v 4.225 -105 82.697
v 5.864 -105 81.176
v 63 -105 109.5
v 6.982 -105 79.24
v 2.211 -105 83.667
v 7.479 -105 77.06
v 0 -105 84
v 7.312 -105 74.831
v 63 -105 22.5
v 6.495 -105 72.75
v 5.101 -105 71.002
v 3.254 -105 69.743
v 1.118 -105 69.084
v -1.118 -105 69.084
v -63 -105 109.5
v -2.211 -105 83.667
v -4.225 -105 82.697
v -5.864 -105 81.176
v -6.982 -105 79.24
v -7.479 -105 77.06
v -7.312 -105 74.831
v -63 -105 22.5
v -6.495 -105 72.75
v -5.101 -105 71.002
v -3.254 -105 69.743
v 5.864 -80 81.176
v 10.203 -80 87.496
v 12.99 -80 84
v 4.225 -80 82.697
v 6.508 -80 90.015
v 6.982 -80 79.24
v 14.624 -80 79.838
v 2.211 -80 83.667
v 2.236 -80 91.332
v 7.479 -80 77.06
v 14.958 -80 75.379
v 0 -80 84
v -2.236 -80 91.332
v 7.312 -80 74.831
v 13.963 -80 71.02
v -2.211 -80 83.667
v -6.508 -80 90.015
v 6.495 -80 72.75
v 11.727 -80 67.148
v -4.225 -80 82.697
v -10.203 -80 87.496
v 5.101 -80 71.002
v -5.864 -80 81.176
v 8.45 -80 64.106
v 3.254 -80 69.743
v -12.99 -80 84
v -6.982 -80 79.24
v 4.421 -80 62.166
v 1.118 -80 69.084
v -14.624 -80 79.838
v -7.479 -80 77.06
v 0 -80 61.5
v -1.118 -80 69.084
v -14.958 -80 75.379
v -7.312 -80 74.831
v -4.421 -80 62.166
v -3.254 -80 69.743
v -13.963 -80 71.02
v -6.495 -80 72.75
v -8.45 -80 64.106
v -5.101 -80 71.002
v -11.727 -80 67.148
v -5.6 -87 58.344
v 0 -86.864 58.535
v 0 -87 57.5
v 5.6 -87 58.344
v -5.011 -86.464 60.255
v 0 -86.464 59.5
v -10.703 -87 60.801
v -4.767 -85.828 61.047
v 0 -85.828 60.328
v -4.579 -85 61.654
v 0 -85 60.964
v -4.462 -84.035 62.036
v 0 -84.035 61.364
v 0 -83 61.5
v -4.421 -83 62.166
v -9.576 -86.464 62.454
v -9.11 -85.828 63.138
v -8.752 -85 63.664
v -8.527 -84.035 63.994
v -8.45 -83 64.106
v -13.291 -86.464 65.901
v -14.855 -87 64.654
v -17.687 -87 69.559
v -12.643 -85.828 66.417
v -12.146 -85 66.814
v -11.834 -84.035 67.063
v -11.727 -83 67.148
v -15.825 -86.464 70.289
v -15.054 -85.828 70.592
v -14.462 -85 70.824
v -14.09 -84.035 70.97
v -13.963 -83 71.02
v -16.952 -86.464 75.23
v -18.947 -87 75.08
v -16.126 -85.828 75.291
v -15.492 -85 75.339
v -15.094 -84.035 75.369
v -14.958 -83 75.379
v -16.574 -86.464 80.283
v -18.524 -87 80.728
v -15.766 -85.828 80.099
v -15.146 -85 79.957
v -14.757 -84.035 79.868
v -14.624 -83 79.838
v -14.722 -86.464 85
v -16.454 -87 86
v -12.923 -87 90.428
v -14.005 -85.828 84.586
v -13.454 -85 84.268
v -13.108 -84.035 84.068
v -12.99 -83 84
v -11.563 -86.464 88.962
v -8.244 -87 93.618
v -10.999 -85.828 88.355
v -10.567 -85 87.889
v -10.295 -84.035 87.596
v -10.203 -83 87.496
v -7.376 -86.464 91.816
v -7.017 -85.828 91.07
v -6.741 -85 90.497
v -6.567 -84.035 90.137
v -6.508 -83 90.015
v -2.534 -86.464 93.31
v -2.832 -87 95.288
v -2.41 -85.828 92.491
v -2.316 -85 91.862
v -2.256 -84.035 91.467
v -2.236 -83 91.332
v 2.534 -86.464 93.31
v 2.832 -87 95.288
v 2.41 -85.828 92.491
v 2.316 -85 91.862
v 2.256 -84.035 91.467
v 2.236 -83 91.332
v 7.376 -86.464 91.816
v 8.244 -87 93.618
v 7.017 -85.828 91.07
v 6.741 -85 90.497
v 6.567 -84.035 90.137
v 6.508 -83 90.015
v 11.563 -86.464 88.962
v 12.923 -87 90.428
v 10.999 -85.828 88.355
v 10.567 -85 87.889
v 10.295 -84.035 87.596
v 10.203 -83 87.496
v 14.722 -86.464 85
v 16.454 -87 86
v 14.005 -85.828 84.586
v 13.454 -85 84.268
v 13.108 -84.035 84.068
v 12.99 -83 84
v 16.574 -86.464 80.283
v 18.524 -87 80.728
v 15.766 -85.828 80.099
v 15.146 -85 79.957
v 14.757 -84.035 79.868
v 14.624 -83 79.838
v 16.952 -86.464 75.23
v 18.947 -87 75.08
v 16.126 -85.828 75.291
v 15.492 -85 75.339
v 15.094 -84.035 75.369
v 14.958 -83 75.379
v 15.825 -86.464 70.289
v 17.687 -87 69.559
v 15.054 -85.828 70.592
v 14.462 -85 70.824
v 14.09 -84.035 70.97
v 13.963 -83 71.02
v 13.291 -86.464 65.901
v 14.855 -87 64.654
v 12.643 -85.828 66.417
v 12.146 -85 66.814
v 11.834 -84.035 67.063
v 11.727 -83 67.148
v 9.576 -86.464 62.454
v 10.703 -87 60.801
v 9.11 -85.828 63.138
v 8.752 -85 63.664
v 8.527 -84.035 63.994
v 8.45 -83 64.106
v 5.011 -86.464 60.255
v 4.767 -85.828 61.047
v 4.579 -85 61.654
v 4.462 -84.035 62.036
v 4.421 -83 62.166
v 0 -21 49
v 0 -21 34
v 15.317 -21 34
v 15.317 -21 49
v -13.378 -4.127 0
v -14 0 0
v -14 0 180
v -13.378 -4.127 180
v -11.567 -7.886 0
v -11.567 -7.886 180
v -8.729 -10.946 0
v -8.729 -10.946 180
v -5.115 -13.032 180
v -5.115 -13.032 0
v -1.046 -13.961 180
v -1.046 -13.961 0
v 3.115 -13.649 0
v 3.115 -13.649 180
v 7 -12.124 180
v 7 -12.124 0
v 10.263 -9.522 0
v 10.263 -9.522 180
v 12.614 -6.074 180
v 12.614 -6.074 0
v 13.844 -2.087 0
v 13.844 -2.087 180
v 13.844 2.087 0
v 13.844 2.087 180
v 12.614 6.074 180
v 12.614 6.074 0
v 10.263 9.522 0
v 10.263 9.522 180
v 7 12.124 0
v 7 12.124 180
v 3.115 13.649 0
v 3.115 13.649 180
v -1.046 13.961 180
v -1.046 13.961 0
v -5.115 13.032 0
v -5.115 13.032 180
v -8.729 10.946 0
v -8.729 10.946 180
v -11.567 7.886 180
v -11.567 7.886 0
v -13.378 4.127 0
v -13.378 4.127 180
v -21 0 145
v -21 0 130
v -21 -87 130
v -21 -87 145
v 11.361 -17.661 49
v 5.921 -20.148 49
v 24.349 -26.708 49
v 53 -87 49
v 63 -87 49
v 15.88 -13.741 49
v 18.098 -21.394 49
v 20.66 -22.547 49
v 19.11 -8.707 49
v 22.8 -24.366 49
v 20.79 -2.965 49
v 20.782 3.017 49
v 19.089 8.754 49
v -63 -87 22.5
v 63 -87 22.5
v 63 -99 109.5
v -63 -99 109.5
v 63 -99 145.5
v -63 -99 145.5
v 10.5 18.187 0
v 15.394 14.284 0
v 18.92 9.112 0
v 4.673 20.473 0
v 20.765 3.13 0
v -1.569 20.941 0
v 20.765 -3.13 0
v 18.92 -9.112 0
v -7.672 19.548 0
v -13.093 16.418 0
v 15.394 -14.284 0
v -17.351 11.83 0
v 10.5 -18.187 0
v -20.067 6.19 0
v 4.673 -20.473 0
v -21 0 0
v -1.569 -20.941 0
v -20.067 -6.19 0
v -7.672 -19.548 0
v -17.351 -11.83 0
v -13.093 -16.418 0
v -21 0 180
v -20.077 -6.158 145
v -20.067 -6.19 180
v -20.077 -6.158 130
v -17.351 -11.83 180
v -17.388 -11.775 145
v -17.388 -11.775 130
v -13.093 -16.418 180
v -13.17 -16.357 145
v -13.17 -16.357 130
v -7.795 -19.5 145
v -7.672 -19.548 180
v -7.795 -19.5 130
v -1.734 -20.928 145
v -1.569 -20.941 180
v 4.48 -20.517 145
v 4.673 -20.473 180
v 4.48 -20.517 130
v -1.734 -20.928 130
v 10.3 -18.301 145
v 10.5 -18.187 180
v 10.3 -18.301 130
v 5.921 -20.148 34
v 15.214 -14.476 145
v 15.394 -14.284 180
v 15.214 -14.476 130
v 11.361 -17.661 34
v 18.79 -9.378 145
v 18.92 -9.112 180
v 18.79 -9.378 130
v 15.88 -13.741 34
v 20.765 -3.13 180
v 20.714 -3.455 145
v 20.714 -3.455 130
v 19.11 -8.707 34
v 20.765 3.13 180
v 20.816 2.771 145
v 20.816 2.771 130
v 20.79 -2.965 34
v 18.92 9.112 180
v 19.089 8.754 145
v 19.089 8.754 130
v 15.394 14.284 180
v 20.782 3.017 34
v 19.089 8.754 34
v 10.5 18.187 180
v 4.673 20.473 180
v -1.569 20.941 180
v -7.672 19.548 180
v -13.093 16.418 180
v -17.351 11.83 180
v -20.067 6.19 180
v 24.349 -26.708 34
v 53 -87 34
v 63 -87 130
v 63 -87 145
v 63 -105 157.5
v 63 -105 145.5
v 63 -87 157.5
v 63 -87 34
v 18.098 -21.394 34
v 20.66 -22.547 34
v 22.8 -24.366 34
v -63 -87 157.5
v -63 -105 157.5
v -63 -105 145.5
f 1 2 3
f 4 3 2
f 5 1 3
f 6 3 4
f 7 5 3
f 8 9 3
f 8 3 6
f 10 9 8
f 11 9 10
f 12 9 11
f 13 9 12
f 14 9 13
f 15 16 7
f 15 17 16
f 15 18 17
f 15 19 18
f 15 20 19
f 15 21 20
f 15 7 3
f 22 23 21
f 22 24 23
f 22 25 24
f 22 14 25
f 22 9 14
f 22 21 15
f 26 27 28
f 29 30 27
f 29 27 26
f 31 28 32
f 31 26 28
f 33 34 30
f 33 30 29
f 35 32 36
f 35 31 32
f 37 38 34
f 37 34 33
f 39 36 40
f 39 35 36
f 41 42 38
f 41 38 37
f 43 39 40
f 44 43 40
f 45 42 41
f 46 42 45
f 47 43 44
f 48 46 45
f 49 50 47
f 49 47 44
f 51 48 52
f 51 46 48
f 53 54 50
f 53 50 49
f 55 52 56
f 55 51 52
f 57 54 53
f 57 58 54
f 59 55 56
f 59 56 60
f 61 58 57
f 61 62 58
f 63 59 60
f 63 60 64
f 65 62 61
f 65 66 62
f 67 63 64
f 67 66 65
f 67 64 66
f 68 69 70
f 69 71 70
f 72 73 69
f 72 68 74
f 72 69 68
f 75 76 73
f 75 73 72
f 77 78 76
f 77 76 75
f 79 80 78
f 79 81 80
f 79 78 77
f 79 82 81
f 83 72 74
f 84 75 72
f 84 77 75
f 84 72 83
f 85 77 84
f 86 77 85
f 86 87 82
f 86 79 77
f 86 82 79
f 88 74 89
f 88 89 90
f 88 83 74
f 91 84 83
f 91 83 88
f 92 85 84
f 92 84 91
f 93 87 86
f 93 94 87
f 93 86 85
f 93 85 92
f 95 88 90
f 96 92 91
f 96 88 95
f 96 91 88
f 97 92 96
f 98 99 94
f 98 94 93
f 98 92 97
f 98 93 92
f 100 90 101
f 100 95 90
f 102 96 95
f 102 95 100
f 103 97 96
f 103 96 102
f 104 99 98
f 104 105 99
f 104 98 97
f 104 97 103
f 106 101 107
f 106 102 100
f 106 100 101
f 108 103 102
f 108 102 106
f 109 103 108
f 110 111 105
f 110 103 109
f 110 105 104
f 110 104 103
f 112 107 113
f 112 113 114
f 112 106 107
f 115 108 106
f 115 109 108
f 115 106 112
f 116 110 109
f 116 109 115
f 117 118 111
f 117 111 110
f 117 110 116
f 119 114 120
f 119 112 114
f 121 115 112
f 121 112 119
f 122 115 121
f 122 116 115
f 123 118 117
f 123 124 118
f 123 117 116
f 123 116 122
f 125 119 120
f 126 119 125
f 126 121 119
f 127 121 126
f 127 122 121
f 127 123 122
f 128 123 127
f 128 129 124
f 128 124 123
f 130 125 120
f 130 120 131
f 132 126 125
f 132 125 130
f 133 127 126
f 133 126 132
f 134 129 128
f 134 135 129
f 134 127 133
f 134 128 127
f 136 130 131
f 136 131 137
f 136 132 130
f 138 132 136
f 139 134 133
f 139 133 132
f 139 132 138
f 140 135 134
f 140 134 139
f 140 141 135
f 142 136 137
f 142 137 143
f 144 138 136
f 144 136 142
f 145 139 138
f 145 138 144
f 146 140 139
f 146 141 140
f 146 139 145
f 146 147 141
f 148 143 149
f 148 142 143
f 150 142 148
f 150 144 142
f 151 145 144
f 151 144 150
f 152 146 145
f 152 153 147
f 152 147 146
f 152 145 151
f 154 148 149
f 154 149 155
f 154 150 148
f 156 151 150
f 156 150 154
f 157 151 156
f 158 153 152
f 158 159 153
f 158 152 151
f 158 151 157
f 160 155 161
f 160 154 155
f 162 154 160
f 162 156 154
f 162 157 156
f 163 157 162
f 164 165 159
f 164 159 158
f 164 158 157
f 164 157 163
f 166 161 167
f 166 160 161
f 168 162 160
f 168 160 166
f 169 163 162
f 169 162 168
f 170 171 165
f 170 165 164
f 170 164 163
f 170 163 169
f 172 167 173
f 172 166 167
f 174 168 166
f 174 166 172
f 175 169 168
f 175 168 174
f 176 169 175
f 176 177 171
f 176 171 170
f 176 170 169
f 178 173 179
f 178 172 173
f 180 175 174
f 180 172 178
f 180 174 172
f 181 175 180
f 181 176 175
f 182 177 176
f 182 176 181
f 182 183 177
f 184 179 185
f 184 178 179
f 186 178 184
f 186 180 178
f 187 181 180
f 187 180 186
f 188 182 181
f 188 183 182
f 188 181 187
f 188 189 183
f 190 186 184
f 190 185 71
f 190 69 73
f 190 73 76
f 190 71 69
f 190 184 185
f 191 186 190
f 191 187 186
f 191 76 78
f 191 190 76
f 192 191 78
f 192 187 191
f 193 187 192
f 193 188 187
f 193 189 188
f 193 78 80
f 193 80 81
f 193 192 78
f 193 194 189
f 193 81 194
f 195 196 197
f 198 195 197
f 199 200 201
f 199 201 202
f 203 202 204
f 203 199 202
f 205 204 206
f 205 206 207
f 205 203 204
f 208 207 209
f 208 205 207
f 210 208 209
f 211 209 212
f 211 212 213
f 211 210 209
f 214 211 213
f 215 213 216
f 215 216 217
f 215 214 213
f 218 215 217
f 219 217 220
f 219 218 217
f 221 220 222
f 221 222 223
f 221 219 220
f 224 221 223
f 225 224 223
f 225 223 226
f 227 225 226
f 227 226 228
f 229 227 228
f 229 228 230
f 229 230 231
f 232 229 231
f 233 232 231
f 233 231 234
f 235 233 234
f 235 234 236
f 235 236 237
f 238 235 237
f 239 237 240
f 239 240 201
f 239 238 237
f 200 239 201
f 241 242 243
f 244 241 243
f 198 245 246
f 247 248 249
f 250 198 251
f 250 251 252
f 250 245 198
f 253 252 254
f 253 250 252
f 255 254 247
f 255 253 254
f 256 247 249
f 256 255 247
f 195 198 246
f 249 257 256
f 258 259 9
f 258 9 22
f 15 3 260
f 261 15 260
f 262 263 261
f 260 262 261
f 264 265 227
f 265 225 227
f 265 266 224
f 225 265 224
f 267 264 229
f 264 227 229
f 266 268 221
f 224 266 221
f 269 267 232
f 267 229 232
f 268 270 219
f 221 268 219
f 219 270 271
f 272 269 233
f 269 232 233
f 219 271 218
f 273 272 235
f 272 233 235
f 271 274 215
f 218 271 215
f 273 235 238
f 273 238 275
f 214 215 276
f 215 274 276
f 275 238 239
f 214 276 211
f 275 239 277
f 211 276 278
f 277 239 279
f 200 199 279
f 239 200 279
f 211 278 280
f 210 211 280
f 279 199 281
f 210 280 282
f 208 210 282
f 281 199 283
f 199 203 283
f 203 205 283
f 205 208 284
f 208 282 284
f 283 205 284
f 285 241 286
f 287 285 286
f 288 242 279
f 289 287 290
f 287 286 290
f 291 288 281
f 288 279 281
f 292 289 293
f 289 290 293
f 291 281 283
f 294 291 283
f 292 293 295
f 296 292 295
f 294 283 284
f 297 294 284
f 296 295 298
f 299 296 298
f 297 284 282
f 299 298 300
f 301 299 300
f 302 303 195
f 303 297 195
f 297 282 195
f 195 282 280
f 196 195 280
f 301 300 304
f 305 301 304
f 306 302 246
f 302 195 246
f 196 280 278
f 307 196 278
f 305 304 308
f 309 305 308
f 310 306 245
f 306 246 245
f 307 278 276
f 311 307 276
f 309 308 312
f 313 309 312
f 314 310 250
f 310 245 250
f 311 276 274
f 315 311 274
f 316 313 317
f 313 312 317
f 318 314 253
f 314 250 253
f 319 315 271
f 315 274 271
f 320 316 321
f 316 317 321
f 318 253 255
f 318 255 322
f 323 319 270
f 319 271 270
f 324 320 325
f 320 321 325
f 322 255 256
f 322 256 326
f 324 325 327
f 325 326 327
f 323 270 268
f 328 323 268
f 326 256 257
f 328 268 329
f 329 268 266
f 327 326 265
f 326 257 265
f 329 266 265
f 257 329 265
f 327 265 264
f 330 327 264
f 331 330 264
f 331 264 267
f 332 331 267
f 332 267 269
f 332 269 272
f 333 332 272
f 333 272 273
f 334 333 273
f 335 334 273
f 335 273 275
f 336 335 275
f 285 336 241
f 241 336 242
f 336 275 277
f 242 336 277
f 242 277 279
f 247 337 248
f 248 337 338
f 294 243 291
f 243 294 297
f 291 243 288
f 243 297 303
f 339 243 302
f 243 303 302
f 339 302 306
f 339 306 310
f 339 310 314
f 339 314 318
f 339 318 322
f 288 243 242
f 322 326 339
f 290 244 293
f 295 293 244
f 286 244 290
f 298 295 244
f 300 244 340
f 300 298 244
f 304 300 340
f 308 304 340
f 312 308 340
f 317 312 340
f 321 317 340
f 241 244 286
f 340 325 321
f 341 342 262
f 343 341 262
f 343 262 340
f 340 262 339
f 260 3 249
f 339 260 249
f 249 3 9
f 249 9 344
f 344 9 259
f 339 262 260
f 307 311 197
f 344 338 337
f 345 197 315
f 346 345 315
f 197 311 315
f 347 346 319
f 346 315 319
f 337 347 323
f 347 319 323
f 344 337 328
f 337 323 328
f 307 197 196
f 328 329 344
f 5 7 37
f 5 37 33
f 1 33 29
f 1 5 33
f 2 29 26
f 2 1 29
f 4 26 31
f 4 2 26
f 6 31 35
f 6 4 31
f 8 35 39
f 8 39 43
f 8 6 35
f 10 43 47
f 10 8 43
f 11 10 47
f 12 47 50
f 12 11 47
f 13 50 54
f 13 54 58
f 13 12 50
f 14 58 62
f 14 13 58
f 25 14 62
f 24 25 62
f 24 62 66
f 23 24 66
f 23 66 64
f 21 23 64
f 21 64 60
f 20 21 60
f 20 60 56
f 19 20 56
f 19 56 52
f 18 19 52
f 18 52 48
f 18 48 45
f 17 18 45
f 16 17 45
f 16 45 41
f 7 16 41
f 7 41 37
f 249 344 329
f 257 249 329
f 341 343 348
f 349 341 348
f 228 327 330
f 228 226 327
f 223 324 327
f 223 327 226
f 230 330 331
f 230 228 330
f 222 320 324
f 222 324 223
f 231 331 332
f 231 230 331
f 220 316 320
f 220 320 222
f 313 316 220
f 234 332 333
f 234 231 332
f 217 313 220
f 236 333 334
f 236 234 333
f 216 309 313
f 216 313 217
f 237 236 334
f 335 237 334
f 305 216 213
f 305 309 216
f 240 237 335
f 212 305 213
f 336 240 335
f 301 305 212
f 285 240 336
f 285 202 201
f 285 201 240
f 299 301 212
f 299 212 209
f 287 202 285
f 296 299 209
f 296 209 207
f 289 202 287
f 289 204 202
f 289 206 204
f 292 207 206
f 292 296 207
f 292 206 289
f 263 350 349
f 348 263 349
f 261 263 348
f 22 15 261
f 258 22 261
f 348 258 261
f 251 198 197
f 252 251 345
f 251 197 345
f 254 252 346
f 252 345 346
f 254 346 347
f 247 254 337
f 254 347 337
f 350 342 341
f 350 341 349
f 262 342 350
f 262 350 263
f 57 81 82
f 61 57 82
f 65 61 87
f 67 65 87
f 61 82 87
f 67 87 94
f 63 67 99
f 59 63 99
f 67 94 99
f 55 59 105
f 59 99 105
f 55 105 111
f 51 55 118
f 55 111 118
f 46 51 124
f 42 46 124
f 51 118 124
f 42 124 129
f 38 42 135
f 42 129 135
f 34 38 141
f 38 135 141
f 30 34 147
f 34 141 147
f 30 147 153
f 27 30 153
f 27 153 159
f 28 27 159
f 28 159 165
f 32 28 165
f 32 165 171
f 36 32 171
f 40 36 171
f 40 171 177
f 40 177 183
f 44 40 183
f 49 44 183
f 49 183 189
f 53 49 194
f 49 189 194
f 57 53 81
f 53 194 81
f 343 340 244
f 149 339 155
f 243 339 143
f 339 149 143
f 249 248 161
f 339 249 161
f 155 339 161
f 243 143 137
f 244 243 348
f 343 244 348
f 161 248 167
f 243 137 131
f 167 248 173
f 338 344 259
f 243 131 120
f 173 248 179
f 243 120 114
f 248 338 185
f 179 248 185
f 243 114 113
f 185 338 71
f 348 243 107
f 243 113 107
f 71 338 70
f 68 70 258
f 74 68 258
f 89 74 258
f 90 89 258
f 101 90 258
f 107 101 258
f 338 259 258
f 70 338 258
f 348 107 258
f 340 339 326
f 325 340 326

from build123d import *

# Parameters (mm, degrees)
SKETCH1_R           = 21
SKETCH1_R_2         = 14
BOSS_EXTRUDE1_DEPTH = 180
SKETCH3_W           = 126
SKETCH3_H           = 18
BOSS_EXTRUDE3_DEPTH = 67.5
SKETCH4_W           = 36
SKETCH4_H           = 6
CUT_EXTRUDE1_DEPTH  = 135
SKETCH5_R           = 15
SKETCH5_R_2         = 7.5
BOSS_EXTRUDE4_DEPTH = 7
FILLET1_R           = 4
BOSS_EXTRUDE5_START = -15
BOSS_EXTRUDE5_DEPTH = 15
BOSS_EXTRUDE6_START = 15
BOSS_EXTRUDE6_DEPTH = 15
CUT_EXTRUDE2_START  = -49
SKETCH9_R           = 7.5
CUT_EXTRUDE2_DEPTH  = 49


with BuildPart() as part:
    # Sketch1 → Boss-Extrude1 (new body)
    with BuildSketch(Plane.XY):
        with Locations(Location((0, 0, 0), (0, 0, 180))):
            Circle(SKETCH1_R)
        with Locations(Location((0, 0, 0), (0, 0, 180))):
            Circle(SKETCH1_R_2, mode=Mode.SUBTRACT)
    extrude(amount=BOSS_EXTRUDE1_DEPTH)



with BuildPart() as body_2:
    # Sketch3 → Boss-Extrude3 (new, symmetric)
    with BuildSketch(Plane(origin=(0, 0, 90), x_dir=(-1, 0, 0), z_dir=(0, 0, -1))):
        with Locations((0, -96)):
            Rectangle(SKETCH3_W, SKETCH3_H)
    extrude(amount=BOSS_EXTRUDE3_DEPTH, both=True)

    # Sketch4 → Cut-Extrude1 (cut)
    with BuildSketch(Plane(origin=(63, 0, 0), x_dir=(0, 0, -1), z_dir=(1, 0, 0))):
        with Locations((-127.5, -102)):
            Rectangle(SKETCH4_W, SKETCH4_H)
    extrude(amount=-CUT_EXTRUDE1_DEPTH, mode=Mode.SUBTRACT)

    # Sketch5 → Boss-Extrude4 (add)
    with BuildSketch(Plane(origin=(0, -87, 0), x_dir=(1, 0, 0), z_dir=(0, 1, 0))):
        with Locations(Location((0, -76.5, 0), (0, 0, 90))):
            Circle(SKETCH5_R)
        with Locations(Location((0, -76.5, 0), (0, 0, 270))):
            Circle(SKETCH5_R_2, mode=Mode.SUBTRACT)
    extrude(amount=BOSS_EXTRUDE4_DEPTH)

    # Fillet1
    fillet1_edges = [body_2.edges().sort_by_distance(p)[0] for p in [
        (0, -87, 91.5),
    ]]
    fillet(fillet1_edges, radius=FILLET1_R)


with BuildPart() as part_1:
    add(part.part)

    add(body_2.part)  # Boss-Extrude5 merges body 2
    # Sketch6 → Boss-Extrude5 (add)
    with BuildSketch(Plane.XY.offset(145).offset(BOSS_EXTRUDE5_START)):
        with BuildLine():
            Line((-21, 0), (-21, -87))
            Line((-21, -87), (63, -87))
            Line((63, -87), (19.088523196, 8.753758176))
            ThreePointArc((19.088523196, 8.753758176), (4.48001188, -20.51656632), (-21, 0))
        make_face()
    extrude(amount=BOSS_EXTRUDE5_DEPTH)

    # Sketch8 → Boss-Extrude6 (add)
    with BuildSketch(Plane(origin=(0, 0, 49), x_dir=(-1, 0, 0), z_dir=(0, 0, -1)).offset(BOSS_EXTRUDE6_START)):
        with BuildLine():
            Line((0, -21), (-15.31737287, -21))
            ThreePointArc((-15.31737287, -21), (-20.659650317, -22.546594078), (-24.349460831, -26.707985664))
            Line((-24.349460831, -26.707985664), (-53, -87))
            Line((-53, -87), (-63, -87))
            Line((-63, -87), (-19.088523196, 8.753758176))
            ThreePointArc((-19.088523196, 8.753758176), (-17.675249952, -11.339556391), (0, -21))
        make_face()
    extrude(amount=-BOSS_EXTRUDE6_DEPTH)

    # Sketch9 → Cut-Extrude2 (cut)
    with BuildSketch(Plane(origin=(0, -87, 0), x_dir=(1, 0, 0), z_dir=(0, 1, 0)).offset(CUT_EXTRUDE2_START)):
        with Locations(Location((0, -76.5, 0), (0, 0, 270))):
            Circle(SKETCH9_R)
    extrude(amount=CUT_EXTRUDE2_DEPTH, mode=Mode.SUBTRACT)


solid = part_1.part
